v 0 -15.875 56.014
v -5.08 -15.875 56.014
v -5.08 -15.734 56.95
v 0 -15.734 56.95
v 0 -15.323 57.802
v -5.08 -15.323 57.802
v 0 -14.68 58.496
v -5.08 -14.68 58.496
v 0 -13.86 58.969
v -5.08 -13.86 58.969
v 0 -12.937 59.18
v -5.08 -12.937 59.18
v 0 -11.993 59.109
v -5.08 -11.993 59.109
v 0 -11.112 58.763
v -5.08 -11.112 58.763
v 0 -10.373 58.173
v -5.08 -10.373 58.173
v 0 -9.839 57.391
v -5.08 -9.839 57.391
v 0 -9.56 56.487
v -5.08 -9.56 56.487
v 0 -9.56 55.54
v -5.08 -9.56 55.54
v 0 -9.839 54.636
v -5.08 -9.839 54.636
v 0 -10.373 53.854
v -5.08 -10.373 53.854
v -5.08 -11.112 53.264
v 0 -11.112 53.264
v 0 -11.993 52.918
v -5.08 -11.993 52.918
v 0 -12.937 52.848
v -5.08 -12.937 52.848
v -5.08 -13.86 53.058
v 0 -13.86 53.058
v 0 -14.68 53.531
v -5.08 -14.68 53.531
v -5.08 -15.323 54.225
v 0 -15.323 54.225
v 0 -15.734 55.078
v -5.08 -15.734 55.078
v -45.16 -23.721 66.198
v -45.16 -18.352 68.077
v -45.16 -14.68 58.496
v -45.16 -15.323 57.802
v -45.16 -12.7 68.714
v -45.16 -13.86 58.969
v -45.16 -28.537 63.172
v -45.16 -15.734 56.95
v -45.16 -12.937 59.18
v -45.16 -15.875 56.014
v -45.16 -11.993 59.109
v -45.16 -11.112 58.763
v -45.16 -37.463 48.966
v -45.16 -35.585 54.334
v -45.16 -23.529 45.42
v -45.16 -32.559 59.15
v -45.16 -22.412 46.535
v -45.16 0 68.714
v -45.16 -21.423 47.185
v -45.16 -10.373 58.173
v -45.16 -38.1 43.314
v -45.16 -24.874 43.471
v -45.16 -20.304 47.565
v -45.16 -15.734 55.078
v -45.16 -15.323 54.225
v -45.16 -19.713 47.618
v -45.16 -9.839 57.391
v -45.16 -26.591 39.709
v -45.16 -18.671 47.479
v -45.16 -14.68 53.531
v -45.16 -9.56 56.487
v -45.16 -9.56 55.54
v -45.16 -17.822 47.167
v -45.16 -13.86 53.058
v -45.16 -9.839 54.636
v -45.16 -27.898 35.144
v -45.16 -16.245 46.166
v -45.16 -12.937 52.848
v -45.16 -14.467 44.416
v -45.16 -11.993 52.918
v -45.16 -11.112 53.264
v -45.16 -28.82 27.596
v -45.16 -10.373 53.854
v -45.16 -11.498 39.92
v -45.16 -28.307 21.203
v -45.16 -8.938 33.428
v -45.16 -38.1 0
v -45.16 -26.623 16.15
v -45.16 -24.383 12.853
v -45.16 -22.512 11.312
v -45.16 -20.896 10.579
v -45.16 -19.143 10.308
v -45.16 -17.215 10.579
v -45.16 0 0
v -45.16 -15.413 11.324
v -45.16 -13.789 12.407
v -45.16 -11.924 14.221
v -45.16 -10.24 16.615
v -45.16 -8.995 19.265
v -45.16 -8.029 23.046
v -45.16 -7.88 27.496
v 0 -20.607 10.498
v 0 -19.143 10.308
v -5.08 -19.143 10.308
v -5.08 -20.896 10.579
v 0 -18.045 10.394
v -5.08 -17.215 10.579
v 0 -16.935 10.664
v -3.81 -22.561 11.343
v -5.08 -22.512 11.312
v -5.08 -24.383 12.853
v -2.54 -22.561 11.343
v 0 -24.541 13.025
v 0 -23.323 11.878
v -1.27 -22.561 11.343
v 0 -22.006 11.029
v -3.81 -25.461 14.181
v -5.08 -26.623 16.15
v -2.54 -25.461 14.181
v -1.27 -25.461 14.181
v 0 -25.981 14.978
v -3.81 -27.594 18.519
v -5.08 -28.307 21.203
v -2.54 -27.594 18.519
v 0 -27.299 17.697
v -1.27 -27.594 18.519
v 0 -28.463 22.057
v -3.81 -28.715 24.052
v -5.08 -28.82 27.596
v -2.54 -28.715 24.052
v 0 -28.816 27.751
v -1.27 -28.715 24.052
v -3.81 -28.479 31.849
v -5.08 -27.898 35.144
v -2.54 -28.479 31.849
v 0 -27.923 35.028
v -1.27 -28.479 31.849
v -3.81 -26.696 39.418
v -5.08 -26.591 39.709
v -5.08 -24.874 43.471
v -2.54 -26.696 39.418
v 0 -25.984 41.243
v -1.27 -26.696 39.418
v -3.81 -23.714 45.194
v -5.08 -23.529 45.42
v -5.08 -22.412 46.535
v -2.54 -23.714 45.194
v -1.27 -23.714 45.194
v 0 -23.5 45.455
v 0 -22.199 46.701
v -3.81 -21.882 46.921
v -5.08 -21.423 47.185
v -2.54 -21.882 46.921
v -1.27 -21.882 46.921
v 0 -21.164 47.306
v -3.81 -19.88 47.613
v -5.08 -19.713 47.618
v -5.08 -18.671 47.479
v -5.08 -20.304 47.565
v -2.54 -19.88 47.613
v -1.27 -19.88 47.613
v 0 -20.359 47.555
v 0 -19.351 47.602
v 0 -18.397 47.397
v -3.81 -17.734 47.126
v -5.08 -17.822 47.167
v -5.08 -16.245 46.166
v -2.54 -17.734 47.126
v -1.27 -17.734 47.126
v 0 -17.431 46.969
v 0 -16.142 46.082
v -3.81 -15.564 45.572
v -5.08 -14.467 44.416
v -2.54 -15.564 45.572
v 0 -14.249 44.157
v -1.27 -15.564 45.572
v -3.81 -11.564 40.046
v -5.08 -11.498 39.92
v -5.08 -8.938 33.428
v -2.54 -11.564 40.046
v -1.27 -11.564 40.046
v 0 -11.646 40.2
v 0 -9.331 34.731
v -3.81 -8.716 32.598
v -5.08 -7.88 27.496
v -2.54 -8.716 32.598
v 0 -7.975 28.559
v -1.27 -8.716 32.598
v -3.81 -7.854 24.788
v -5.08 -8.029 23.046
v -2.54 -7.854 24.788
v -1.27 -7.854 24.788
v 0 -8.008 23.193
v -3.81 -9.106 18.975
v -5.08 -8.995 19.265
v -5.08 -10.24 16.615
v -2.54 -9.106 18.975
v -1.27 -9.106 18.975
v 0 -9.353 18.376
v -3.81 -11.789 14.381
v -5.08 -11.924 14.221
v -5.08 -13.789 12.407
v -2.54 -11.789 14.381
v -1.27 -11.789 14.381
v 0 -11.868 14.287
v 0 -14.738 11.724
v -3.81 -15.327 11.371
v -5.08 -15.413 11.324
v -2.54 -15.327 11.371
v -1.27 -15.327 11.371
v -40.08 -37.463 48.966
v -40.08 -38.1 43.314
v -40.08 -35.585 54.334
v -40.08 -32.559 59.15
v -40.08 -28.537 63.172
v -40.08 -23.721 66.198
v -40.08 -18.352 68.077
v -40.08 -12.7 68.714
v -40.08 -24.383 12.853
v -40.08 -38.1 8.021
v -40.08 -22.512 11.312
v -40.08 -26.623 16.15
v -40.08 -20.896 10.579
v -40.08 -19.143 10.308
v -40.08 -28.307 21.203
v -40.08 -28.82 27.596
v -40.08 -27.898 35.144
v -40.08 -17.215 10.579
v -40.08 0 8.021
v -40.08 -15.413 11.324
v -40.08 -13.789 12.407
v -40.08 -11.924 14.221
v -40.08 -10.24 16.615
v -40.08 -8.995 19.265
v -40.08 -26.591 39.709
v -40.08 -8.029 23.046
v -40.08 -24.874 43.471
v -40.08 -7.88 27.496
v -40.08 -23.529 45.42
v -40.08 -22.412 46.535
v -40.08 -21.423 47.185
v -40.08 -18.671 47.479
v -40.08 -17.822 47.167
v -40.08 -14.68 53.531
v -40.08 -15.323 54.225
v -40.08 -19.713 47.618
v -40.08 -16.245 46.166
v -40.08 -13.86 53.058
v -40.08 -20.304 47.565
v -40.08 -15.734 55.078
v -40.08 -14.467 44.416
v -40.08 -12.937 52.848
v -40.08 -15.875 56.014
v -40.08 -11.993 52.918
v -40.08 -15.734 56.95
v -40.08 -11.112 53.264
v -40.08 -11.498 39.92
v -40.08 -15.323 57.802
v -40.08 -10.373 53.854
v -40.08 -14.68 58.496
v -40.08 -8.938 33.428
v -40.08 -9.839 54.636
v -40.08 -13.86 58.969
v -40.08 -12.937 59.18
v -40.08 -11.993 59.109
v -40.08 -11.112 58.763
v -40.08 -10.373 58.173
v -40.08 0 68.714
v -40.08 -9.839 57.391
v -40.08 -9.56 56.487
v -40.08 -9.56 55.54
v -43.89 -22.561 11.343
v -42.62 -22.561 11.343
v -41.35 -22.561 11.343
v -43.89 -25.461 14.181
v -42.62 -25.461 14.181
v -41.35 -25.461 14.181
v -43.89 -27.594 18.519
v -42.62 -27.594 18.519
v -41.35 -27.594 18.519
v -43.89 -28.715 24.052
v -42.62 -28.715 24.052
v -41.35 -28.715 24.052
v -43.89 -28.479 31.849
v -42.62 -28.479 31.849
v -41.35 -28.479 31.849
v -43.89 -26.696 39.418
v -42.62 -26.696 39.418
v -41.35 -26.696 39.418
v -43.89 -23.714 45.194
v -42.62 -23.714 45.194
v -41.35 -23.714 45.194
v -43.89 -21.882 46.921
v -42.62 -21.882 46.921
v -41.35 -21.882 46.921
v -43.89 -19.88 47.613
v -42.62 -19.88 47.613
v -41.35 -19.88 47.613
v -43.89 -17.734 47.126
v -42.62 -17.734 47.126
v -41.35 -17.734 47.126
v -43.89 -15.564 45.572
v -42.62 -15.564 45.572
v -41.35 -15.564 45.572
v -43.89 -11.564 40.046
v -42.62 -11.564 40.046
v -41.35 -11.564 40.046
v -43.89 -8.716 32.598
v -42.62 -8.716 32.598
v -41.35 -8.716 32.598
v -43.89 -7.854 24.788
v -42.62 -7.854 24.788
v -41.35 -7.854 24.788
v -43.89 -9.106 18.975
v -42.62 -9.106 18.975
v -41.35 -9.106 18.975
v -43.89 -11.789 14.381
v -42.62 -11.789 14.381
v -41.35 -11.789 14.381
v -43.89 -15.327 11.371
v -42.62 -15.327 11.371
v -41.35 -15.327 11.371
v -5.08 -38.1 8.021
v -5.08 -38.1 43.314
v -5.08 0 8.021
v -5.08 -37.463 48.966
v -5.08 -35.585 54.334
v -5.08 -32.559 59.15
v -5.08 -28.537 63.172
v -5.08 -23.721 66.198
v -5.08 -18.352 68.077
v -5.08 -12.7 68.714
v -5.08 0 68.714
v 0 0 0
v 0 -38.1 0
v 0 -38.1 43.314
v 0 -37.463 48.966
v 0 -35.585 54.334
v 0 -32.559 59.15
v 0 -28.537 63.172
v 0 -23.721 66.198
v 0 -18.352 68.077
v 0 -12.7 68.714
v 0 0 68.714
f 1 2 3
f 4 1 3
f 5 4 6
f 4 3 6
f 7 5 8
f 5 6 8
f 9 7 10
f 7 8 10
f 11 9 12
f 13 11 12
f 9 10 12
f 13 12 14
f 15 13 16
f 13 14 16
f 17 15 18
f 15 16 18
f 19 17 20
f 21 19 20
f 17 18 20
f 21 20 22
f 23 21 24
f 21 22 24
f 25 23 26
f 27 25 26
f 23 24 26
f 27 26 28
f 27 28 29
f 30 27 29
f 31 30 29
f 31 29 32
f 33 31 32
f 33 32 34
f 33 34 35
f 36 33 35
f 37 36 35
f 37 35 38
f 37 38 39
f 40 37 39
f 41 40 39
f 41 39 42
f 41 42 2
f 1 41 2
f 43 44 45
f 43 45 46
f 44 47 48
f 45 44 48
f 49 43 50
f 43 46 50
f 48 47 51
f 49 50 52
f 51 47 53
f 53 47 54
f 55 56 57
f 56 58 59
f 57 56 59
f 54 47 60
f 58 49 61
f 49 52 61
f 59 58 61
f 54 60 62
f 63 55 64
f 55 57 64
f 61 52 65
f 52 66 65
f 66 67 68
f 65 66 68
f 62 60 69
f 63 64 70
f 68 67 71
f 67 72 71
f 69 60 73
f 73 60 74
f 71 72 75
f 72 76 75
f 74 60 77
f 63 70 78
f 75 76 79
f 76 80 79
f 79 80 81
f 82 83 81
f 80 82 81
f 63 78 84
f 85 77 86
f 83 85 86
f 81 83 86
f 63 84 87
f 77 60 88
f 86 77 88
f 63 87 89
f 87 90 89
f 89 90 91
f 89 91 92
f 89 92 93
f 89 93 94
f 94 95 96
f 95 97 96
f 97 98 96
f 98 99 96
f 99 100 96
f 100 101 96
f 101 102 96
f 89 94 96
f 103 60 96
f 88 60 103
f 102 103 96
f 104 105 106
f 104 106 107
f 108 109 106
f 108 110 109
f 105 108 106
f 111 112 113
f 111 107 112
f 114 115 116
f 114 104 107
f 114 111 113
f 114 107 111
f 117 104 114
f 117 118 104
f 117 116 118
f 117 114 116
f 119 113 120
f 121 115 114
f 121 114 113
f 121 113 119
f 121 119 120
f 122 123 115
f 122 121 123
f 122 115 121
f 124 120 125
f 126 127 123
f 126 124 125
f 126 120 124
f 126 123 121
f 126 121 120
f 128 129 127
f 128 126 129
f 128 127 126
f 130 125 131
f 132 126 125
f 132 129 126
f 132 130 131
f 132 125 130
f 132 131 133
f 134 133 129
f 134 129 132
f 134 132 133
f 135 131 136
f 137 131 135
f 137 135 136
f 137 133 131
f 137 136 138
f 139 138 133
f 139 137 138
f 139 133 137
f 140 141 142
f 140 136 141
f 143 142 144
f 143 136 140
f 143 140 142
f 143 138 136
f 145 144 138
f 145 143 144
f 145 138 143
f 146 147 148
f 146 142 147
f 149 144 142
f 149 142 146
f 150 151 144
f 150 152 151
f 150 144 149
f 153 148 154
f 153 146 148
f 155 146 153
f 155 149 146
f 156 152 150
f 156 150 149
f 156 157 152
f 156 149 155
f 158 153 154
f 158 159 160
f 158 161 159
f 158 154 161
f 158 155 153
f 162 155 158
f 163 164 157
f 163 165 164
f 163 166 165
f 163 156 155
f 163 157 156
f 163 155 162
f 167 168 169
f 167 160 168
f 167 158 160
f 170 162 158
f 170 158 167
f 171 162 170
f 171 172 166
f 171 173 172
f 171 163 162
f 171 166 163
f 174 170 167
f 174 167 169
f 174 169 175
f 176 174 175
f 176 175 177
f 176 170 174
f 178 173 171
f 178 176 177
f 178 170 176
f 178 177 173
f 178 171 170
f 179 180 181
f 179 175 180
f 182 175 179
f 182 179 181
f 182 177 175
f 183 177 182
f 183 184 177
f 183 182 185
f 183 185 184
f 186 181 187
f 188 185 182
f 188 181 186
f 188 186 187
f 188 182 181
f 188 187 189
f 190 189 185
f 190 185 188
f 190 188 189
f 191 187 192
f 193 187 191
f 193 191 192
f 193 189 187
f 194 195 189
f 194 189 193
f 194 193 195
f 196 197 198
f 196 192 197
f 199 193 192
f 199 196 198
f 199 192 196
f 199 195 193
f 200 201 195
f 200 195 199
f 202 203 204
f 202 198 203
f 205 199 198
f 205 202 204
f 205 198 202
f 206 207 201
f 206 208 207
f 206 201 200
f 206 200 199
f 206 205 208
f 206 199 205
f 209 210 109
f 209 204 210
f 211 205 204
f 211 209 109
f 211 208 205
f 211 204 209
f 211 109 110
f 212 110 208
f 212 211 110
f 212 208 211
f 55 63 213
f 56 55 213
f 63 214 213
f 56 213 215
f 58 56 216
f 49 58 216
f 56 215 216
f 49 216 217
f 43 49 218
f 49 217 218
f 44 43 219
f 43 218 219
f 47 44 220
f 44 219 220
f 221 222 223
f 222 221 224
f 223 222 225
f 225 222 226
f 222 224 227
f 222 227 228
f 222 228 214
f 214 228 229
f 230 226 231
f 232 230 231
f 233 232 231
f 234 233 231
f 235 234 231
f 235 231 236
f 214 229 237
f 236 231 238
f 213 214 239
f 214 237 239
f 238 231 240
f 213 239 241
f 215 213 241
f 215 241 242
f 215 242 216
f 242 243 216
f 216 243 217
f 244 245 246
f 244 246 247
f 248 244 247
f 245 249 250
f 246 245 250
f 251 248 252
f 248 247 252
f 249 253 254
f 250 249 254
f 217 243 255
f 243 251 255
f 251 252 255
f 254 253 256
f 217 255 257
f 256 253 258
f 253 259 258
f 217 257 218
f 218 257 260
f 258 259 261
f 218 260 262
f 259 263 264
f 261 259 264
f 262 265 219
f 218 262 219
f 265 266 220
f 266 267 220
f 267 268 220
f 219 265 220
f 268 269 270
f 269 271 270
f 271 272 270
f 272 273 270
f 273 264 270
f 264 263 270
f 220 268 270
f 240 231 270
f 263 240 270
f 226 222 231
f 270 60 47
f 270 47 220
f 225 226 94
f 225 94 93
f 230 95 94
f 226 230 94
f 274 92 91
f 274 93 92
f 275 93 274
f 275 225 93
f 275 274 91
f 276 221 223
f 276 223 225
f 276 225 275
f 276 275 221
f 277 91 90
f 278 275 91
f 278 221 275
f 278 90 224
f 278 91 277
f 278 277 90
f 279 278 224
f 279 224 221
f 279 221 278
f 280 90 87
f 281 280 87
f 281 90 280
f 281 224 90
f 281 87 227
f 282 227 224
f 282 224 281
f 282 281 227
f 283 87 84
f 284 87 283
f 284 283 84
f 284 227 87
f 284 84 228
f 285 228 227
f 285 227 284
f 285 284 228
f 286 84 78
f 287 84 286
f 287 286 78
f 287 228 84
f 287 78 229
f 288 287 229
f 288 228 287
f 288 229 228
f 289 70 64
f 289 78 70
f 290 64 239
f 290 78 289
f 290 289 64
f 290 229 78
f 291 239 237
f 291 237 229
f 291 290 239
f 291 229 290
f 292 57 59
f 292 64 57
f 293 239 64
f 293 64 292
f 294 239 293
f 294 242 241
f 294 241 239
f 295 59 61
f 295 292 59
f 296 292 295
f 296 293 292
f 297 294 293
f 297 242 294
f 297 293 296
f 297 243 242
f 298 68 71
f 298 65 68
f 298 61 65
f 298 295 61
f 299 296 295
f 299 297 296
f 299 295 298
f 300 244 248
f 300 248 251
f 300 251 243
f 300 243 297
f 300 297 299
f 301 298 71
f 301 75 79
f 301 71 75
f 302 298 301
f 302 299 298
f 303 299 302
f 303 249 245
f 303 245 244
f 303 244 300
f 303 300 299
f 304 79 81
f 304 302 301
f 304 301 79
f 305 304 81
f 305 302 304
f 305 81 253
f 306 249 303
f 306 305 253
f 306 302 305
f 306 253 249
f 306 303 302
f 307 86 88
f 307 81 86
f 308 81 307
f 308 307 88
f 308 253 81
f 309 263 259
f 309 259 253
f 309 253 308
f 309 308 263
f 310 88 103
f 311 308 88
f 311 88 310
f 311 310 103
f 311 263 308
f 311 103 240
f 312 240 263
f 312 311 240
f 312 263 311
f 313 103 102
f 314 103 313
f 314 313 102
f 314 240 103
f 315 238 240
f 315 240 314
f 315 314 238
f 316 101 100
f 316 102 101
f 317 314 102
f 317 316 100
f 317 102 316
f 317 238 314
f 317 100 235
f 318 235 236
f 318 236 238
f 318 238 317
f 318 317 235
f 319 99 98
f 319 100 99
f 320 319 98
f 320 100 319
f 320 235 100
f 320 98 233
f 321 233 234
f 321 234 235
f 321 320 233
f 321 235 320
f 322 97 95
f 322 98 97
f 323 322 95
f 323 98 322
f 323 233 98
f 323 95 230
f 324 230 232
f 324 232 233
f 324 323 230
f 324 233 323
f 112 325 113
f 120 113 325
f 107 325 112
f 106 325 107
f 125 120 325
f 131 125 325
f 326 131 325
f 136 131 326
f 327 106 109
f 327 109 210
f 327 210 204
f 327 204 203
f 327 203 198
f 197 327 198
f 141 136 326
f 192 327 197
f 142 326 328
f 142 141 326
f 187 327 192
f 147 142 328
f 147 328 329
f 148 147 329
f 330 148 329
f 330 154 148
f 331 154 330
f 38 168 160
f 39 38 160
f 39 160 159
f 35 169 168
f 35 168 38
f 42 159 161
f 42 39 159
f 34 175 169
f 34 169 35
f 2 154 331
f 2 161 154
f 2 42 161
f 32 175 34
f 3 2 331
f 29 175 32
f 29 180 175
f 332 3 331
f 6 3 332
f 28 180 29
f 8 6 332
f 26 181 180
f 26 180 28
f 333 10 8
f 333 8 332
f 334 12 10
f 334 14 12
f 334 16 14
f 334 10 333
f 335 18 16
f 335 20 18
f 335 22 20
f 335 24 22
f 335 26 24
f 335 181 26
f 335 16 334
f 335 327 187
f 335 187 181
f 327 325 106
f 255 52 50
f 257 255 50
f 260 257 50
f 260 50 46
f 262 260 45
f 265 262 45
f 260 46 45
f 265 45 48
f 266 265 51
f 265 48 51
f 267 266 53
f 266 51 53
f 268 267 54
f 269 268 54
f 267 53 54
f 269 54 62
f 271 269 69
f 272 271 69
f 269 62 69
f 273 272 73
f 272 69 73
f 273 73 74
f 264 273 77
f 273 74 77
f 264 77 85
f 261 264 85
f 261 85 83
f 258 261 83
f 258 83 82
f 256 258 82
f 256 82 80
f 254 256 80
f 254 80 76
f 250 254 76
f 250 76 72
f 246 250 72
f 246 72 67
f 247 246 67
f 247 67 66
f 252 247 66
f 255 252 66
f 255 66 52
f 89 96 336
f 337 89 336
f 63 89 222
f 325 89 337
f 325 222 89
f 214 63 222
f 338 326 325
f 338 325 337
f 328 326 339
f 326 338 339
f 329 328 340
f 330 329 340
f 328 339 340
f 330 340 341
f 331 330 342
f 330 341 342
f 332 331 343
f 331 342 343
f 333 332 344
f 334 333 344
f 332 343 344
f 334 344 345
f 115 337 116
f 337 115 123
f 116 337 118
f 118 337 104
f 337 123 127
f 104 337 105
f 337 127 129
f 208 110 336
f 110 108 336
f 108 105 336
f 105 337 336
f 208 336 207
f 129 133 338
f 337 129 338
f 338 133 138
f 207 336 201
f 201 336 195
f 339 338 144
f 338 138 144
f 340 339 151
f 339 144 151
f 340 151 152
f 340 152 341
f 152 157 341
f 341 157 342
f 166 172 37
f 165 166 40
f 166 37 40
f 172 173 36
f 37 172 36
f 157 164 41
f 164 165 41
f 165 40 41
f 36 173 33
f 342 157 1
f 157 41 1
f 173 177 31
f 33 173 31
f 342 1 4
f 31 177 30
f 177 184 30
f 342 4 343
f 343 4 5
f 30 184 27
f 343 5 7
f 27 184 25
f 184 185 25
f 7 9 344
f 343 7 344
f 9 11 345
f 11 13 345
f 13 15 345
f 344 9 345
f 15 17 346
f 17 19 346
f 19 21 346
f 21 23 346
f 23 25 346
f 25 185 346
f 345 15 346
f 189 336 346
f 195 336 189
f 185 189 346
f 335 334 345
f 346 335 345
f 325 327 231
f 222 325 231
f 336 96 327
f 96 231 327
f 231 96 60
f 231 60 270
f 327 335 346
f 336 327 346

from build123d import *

# Parameters (mm, degrees)
F0_W     = 5.08
F0_H     = 60.6926516568
F1_DEPTH = 38.1
F3_D     = 6.35
F4_DEPTH = 45.161
F5_R     = 25.4


# Not quite as in the source:
# - a feature names something its author has since deleted; it is built from what else it names


with BuildPart() as f1:
    # F0 (on Front) → F1 (new body)
    with BuildSketch(Plane.XZ):
        Polygon((-45.16, 0), (0, 0), (0, 8.0210549811), (-5.08, 8.0210549811), (-40.08, 8.0210549811), (-45.16, 8.0210549811), align=None)
        with Locations((-2.54, 38.3673808095)):
            Rectangle(F0_W, F0_H)
        with Locations((-42.62, 38.3673808095)):
            Rectangle(F0_W, F0_H)
    extrude(amount=F1_DEPTH)

    # F3 (through all)
    with Locations(Plane.YZ):
        with Locations((-12.7, 56.0137066379)):
            Hole(F3_D / 2)

    # F2 (on Right) → F4 (cut, through all)
    with BuildSketch(Plane.YZ):
        with BuildLine():
            add(Edge.make_bspline(
                [(-19.1434975713, 10.3080365807), (-23.9365403388, 10.3492805031), (-32.9940706123, 22.9579895891), (-21.1738830705, 60.90718063), (-1.4242230003, 23.6437509657), (-14.1250016542, 10.2648526438), (-19.1434975713, 10.3080365807)],
                knots=[0, 0, 0, 0, 0.2215384982, 0.4930848573, 0.7680408662, 1, 1, 1, 1], degree=3))
        make_face()
    extrude(amount=-F4_DEPTH, mode=Mode.SUBTRACT)

    # F5
    f5_edges = [f1.edges().sort_by_distance(p)[0] for p in [
        (-2.54, -38.1, 68.713707),
        (-42.62, -38.1, 68.713707),
    ]]
    fillet(f5_edges, radius=F5_R)


solid = f1.part
